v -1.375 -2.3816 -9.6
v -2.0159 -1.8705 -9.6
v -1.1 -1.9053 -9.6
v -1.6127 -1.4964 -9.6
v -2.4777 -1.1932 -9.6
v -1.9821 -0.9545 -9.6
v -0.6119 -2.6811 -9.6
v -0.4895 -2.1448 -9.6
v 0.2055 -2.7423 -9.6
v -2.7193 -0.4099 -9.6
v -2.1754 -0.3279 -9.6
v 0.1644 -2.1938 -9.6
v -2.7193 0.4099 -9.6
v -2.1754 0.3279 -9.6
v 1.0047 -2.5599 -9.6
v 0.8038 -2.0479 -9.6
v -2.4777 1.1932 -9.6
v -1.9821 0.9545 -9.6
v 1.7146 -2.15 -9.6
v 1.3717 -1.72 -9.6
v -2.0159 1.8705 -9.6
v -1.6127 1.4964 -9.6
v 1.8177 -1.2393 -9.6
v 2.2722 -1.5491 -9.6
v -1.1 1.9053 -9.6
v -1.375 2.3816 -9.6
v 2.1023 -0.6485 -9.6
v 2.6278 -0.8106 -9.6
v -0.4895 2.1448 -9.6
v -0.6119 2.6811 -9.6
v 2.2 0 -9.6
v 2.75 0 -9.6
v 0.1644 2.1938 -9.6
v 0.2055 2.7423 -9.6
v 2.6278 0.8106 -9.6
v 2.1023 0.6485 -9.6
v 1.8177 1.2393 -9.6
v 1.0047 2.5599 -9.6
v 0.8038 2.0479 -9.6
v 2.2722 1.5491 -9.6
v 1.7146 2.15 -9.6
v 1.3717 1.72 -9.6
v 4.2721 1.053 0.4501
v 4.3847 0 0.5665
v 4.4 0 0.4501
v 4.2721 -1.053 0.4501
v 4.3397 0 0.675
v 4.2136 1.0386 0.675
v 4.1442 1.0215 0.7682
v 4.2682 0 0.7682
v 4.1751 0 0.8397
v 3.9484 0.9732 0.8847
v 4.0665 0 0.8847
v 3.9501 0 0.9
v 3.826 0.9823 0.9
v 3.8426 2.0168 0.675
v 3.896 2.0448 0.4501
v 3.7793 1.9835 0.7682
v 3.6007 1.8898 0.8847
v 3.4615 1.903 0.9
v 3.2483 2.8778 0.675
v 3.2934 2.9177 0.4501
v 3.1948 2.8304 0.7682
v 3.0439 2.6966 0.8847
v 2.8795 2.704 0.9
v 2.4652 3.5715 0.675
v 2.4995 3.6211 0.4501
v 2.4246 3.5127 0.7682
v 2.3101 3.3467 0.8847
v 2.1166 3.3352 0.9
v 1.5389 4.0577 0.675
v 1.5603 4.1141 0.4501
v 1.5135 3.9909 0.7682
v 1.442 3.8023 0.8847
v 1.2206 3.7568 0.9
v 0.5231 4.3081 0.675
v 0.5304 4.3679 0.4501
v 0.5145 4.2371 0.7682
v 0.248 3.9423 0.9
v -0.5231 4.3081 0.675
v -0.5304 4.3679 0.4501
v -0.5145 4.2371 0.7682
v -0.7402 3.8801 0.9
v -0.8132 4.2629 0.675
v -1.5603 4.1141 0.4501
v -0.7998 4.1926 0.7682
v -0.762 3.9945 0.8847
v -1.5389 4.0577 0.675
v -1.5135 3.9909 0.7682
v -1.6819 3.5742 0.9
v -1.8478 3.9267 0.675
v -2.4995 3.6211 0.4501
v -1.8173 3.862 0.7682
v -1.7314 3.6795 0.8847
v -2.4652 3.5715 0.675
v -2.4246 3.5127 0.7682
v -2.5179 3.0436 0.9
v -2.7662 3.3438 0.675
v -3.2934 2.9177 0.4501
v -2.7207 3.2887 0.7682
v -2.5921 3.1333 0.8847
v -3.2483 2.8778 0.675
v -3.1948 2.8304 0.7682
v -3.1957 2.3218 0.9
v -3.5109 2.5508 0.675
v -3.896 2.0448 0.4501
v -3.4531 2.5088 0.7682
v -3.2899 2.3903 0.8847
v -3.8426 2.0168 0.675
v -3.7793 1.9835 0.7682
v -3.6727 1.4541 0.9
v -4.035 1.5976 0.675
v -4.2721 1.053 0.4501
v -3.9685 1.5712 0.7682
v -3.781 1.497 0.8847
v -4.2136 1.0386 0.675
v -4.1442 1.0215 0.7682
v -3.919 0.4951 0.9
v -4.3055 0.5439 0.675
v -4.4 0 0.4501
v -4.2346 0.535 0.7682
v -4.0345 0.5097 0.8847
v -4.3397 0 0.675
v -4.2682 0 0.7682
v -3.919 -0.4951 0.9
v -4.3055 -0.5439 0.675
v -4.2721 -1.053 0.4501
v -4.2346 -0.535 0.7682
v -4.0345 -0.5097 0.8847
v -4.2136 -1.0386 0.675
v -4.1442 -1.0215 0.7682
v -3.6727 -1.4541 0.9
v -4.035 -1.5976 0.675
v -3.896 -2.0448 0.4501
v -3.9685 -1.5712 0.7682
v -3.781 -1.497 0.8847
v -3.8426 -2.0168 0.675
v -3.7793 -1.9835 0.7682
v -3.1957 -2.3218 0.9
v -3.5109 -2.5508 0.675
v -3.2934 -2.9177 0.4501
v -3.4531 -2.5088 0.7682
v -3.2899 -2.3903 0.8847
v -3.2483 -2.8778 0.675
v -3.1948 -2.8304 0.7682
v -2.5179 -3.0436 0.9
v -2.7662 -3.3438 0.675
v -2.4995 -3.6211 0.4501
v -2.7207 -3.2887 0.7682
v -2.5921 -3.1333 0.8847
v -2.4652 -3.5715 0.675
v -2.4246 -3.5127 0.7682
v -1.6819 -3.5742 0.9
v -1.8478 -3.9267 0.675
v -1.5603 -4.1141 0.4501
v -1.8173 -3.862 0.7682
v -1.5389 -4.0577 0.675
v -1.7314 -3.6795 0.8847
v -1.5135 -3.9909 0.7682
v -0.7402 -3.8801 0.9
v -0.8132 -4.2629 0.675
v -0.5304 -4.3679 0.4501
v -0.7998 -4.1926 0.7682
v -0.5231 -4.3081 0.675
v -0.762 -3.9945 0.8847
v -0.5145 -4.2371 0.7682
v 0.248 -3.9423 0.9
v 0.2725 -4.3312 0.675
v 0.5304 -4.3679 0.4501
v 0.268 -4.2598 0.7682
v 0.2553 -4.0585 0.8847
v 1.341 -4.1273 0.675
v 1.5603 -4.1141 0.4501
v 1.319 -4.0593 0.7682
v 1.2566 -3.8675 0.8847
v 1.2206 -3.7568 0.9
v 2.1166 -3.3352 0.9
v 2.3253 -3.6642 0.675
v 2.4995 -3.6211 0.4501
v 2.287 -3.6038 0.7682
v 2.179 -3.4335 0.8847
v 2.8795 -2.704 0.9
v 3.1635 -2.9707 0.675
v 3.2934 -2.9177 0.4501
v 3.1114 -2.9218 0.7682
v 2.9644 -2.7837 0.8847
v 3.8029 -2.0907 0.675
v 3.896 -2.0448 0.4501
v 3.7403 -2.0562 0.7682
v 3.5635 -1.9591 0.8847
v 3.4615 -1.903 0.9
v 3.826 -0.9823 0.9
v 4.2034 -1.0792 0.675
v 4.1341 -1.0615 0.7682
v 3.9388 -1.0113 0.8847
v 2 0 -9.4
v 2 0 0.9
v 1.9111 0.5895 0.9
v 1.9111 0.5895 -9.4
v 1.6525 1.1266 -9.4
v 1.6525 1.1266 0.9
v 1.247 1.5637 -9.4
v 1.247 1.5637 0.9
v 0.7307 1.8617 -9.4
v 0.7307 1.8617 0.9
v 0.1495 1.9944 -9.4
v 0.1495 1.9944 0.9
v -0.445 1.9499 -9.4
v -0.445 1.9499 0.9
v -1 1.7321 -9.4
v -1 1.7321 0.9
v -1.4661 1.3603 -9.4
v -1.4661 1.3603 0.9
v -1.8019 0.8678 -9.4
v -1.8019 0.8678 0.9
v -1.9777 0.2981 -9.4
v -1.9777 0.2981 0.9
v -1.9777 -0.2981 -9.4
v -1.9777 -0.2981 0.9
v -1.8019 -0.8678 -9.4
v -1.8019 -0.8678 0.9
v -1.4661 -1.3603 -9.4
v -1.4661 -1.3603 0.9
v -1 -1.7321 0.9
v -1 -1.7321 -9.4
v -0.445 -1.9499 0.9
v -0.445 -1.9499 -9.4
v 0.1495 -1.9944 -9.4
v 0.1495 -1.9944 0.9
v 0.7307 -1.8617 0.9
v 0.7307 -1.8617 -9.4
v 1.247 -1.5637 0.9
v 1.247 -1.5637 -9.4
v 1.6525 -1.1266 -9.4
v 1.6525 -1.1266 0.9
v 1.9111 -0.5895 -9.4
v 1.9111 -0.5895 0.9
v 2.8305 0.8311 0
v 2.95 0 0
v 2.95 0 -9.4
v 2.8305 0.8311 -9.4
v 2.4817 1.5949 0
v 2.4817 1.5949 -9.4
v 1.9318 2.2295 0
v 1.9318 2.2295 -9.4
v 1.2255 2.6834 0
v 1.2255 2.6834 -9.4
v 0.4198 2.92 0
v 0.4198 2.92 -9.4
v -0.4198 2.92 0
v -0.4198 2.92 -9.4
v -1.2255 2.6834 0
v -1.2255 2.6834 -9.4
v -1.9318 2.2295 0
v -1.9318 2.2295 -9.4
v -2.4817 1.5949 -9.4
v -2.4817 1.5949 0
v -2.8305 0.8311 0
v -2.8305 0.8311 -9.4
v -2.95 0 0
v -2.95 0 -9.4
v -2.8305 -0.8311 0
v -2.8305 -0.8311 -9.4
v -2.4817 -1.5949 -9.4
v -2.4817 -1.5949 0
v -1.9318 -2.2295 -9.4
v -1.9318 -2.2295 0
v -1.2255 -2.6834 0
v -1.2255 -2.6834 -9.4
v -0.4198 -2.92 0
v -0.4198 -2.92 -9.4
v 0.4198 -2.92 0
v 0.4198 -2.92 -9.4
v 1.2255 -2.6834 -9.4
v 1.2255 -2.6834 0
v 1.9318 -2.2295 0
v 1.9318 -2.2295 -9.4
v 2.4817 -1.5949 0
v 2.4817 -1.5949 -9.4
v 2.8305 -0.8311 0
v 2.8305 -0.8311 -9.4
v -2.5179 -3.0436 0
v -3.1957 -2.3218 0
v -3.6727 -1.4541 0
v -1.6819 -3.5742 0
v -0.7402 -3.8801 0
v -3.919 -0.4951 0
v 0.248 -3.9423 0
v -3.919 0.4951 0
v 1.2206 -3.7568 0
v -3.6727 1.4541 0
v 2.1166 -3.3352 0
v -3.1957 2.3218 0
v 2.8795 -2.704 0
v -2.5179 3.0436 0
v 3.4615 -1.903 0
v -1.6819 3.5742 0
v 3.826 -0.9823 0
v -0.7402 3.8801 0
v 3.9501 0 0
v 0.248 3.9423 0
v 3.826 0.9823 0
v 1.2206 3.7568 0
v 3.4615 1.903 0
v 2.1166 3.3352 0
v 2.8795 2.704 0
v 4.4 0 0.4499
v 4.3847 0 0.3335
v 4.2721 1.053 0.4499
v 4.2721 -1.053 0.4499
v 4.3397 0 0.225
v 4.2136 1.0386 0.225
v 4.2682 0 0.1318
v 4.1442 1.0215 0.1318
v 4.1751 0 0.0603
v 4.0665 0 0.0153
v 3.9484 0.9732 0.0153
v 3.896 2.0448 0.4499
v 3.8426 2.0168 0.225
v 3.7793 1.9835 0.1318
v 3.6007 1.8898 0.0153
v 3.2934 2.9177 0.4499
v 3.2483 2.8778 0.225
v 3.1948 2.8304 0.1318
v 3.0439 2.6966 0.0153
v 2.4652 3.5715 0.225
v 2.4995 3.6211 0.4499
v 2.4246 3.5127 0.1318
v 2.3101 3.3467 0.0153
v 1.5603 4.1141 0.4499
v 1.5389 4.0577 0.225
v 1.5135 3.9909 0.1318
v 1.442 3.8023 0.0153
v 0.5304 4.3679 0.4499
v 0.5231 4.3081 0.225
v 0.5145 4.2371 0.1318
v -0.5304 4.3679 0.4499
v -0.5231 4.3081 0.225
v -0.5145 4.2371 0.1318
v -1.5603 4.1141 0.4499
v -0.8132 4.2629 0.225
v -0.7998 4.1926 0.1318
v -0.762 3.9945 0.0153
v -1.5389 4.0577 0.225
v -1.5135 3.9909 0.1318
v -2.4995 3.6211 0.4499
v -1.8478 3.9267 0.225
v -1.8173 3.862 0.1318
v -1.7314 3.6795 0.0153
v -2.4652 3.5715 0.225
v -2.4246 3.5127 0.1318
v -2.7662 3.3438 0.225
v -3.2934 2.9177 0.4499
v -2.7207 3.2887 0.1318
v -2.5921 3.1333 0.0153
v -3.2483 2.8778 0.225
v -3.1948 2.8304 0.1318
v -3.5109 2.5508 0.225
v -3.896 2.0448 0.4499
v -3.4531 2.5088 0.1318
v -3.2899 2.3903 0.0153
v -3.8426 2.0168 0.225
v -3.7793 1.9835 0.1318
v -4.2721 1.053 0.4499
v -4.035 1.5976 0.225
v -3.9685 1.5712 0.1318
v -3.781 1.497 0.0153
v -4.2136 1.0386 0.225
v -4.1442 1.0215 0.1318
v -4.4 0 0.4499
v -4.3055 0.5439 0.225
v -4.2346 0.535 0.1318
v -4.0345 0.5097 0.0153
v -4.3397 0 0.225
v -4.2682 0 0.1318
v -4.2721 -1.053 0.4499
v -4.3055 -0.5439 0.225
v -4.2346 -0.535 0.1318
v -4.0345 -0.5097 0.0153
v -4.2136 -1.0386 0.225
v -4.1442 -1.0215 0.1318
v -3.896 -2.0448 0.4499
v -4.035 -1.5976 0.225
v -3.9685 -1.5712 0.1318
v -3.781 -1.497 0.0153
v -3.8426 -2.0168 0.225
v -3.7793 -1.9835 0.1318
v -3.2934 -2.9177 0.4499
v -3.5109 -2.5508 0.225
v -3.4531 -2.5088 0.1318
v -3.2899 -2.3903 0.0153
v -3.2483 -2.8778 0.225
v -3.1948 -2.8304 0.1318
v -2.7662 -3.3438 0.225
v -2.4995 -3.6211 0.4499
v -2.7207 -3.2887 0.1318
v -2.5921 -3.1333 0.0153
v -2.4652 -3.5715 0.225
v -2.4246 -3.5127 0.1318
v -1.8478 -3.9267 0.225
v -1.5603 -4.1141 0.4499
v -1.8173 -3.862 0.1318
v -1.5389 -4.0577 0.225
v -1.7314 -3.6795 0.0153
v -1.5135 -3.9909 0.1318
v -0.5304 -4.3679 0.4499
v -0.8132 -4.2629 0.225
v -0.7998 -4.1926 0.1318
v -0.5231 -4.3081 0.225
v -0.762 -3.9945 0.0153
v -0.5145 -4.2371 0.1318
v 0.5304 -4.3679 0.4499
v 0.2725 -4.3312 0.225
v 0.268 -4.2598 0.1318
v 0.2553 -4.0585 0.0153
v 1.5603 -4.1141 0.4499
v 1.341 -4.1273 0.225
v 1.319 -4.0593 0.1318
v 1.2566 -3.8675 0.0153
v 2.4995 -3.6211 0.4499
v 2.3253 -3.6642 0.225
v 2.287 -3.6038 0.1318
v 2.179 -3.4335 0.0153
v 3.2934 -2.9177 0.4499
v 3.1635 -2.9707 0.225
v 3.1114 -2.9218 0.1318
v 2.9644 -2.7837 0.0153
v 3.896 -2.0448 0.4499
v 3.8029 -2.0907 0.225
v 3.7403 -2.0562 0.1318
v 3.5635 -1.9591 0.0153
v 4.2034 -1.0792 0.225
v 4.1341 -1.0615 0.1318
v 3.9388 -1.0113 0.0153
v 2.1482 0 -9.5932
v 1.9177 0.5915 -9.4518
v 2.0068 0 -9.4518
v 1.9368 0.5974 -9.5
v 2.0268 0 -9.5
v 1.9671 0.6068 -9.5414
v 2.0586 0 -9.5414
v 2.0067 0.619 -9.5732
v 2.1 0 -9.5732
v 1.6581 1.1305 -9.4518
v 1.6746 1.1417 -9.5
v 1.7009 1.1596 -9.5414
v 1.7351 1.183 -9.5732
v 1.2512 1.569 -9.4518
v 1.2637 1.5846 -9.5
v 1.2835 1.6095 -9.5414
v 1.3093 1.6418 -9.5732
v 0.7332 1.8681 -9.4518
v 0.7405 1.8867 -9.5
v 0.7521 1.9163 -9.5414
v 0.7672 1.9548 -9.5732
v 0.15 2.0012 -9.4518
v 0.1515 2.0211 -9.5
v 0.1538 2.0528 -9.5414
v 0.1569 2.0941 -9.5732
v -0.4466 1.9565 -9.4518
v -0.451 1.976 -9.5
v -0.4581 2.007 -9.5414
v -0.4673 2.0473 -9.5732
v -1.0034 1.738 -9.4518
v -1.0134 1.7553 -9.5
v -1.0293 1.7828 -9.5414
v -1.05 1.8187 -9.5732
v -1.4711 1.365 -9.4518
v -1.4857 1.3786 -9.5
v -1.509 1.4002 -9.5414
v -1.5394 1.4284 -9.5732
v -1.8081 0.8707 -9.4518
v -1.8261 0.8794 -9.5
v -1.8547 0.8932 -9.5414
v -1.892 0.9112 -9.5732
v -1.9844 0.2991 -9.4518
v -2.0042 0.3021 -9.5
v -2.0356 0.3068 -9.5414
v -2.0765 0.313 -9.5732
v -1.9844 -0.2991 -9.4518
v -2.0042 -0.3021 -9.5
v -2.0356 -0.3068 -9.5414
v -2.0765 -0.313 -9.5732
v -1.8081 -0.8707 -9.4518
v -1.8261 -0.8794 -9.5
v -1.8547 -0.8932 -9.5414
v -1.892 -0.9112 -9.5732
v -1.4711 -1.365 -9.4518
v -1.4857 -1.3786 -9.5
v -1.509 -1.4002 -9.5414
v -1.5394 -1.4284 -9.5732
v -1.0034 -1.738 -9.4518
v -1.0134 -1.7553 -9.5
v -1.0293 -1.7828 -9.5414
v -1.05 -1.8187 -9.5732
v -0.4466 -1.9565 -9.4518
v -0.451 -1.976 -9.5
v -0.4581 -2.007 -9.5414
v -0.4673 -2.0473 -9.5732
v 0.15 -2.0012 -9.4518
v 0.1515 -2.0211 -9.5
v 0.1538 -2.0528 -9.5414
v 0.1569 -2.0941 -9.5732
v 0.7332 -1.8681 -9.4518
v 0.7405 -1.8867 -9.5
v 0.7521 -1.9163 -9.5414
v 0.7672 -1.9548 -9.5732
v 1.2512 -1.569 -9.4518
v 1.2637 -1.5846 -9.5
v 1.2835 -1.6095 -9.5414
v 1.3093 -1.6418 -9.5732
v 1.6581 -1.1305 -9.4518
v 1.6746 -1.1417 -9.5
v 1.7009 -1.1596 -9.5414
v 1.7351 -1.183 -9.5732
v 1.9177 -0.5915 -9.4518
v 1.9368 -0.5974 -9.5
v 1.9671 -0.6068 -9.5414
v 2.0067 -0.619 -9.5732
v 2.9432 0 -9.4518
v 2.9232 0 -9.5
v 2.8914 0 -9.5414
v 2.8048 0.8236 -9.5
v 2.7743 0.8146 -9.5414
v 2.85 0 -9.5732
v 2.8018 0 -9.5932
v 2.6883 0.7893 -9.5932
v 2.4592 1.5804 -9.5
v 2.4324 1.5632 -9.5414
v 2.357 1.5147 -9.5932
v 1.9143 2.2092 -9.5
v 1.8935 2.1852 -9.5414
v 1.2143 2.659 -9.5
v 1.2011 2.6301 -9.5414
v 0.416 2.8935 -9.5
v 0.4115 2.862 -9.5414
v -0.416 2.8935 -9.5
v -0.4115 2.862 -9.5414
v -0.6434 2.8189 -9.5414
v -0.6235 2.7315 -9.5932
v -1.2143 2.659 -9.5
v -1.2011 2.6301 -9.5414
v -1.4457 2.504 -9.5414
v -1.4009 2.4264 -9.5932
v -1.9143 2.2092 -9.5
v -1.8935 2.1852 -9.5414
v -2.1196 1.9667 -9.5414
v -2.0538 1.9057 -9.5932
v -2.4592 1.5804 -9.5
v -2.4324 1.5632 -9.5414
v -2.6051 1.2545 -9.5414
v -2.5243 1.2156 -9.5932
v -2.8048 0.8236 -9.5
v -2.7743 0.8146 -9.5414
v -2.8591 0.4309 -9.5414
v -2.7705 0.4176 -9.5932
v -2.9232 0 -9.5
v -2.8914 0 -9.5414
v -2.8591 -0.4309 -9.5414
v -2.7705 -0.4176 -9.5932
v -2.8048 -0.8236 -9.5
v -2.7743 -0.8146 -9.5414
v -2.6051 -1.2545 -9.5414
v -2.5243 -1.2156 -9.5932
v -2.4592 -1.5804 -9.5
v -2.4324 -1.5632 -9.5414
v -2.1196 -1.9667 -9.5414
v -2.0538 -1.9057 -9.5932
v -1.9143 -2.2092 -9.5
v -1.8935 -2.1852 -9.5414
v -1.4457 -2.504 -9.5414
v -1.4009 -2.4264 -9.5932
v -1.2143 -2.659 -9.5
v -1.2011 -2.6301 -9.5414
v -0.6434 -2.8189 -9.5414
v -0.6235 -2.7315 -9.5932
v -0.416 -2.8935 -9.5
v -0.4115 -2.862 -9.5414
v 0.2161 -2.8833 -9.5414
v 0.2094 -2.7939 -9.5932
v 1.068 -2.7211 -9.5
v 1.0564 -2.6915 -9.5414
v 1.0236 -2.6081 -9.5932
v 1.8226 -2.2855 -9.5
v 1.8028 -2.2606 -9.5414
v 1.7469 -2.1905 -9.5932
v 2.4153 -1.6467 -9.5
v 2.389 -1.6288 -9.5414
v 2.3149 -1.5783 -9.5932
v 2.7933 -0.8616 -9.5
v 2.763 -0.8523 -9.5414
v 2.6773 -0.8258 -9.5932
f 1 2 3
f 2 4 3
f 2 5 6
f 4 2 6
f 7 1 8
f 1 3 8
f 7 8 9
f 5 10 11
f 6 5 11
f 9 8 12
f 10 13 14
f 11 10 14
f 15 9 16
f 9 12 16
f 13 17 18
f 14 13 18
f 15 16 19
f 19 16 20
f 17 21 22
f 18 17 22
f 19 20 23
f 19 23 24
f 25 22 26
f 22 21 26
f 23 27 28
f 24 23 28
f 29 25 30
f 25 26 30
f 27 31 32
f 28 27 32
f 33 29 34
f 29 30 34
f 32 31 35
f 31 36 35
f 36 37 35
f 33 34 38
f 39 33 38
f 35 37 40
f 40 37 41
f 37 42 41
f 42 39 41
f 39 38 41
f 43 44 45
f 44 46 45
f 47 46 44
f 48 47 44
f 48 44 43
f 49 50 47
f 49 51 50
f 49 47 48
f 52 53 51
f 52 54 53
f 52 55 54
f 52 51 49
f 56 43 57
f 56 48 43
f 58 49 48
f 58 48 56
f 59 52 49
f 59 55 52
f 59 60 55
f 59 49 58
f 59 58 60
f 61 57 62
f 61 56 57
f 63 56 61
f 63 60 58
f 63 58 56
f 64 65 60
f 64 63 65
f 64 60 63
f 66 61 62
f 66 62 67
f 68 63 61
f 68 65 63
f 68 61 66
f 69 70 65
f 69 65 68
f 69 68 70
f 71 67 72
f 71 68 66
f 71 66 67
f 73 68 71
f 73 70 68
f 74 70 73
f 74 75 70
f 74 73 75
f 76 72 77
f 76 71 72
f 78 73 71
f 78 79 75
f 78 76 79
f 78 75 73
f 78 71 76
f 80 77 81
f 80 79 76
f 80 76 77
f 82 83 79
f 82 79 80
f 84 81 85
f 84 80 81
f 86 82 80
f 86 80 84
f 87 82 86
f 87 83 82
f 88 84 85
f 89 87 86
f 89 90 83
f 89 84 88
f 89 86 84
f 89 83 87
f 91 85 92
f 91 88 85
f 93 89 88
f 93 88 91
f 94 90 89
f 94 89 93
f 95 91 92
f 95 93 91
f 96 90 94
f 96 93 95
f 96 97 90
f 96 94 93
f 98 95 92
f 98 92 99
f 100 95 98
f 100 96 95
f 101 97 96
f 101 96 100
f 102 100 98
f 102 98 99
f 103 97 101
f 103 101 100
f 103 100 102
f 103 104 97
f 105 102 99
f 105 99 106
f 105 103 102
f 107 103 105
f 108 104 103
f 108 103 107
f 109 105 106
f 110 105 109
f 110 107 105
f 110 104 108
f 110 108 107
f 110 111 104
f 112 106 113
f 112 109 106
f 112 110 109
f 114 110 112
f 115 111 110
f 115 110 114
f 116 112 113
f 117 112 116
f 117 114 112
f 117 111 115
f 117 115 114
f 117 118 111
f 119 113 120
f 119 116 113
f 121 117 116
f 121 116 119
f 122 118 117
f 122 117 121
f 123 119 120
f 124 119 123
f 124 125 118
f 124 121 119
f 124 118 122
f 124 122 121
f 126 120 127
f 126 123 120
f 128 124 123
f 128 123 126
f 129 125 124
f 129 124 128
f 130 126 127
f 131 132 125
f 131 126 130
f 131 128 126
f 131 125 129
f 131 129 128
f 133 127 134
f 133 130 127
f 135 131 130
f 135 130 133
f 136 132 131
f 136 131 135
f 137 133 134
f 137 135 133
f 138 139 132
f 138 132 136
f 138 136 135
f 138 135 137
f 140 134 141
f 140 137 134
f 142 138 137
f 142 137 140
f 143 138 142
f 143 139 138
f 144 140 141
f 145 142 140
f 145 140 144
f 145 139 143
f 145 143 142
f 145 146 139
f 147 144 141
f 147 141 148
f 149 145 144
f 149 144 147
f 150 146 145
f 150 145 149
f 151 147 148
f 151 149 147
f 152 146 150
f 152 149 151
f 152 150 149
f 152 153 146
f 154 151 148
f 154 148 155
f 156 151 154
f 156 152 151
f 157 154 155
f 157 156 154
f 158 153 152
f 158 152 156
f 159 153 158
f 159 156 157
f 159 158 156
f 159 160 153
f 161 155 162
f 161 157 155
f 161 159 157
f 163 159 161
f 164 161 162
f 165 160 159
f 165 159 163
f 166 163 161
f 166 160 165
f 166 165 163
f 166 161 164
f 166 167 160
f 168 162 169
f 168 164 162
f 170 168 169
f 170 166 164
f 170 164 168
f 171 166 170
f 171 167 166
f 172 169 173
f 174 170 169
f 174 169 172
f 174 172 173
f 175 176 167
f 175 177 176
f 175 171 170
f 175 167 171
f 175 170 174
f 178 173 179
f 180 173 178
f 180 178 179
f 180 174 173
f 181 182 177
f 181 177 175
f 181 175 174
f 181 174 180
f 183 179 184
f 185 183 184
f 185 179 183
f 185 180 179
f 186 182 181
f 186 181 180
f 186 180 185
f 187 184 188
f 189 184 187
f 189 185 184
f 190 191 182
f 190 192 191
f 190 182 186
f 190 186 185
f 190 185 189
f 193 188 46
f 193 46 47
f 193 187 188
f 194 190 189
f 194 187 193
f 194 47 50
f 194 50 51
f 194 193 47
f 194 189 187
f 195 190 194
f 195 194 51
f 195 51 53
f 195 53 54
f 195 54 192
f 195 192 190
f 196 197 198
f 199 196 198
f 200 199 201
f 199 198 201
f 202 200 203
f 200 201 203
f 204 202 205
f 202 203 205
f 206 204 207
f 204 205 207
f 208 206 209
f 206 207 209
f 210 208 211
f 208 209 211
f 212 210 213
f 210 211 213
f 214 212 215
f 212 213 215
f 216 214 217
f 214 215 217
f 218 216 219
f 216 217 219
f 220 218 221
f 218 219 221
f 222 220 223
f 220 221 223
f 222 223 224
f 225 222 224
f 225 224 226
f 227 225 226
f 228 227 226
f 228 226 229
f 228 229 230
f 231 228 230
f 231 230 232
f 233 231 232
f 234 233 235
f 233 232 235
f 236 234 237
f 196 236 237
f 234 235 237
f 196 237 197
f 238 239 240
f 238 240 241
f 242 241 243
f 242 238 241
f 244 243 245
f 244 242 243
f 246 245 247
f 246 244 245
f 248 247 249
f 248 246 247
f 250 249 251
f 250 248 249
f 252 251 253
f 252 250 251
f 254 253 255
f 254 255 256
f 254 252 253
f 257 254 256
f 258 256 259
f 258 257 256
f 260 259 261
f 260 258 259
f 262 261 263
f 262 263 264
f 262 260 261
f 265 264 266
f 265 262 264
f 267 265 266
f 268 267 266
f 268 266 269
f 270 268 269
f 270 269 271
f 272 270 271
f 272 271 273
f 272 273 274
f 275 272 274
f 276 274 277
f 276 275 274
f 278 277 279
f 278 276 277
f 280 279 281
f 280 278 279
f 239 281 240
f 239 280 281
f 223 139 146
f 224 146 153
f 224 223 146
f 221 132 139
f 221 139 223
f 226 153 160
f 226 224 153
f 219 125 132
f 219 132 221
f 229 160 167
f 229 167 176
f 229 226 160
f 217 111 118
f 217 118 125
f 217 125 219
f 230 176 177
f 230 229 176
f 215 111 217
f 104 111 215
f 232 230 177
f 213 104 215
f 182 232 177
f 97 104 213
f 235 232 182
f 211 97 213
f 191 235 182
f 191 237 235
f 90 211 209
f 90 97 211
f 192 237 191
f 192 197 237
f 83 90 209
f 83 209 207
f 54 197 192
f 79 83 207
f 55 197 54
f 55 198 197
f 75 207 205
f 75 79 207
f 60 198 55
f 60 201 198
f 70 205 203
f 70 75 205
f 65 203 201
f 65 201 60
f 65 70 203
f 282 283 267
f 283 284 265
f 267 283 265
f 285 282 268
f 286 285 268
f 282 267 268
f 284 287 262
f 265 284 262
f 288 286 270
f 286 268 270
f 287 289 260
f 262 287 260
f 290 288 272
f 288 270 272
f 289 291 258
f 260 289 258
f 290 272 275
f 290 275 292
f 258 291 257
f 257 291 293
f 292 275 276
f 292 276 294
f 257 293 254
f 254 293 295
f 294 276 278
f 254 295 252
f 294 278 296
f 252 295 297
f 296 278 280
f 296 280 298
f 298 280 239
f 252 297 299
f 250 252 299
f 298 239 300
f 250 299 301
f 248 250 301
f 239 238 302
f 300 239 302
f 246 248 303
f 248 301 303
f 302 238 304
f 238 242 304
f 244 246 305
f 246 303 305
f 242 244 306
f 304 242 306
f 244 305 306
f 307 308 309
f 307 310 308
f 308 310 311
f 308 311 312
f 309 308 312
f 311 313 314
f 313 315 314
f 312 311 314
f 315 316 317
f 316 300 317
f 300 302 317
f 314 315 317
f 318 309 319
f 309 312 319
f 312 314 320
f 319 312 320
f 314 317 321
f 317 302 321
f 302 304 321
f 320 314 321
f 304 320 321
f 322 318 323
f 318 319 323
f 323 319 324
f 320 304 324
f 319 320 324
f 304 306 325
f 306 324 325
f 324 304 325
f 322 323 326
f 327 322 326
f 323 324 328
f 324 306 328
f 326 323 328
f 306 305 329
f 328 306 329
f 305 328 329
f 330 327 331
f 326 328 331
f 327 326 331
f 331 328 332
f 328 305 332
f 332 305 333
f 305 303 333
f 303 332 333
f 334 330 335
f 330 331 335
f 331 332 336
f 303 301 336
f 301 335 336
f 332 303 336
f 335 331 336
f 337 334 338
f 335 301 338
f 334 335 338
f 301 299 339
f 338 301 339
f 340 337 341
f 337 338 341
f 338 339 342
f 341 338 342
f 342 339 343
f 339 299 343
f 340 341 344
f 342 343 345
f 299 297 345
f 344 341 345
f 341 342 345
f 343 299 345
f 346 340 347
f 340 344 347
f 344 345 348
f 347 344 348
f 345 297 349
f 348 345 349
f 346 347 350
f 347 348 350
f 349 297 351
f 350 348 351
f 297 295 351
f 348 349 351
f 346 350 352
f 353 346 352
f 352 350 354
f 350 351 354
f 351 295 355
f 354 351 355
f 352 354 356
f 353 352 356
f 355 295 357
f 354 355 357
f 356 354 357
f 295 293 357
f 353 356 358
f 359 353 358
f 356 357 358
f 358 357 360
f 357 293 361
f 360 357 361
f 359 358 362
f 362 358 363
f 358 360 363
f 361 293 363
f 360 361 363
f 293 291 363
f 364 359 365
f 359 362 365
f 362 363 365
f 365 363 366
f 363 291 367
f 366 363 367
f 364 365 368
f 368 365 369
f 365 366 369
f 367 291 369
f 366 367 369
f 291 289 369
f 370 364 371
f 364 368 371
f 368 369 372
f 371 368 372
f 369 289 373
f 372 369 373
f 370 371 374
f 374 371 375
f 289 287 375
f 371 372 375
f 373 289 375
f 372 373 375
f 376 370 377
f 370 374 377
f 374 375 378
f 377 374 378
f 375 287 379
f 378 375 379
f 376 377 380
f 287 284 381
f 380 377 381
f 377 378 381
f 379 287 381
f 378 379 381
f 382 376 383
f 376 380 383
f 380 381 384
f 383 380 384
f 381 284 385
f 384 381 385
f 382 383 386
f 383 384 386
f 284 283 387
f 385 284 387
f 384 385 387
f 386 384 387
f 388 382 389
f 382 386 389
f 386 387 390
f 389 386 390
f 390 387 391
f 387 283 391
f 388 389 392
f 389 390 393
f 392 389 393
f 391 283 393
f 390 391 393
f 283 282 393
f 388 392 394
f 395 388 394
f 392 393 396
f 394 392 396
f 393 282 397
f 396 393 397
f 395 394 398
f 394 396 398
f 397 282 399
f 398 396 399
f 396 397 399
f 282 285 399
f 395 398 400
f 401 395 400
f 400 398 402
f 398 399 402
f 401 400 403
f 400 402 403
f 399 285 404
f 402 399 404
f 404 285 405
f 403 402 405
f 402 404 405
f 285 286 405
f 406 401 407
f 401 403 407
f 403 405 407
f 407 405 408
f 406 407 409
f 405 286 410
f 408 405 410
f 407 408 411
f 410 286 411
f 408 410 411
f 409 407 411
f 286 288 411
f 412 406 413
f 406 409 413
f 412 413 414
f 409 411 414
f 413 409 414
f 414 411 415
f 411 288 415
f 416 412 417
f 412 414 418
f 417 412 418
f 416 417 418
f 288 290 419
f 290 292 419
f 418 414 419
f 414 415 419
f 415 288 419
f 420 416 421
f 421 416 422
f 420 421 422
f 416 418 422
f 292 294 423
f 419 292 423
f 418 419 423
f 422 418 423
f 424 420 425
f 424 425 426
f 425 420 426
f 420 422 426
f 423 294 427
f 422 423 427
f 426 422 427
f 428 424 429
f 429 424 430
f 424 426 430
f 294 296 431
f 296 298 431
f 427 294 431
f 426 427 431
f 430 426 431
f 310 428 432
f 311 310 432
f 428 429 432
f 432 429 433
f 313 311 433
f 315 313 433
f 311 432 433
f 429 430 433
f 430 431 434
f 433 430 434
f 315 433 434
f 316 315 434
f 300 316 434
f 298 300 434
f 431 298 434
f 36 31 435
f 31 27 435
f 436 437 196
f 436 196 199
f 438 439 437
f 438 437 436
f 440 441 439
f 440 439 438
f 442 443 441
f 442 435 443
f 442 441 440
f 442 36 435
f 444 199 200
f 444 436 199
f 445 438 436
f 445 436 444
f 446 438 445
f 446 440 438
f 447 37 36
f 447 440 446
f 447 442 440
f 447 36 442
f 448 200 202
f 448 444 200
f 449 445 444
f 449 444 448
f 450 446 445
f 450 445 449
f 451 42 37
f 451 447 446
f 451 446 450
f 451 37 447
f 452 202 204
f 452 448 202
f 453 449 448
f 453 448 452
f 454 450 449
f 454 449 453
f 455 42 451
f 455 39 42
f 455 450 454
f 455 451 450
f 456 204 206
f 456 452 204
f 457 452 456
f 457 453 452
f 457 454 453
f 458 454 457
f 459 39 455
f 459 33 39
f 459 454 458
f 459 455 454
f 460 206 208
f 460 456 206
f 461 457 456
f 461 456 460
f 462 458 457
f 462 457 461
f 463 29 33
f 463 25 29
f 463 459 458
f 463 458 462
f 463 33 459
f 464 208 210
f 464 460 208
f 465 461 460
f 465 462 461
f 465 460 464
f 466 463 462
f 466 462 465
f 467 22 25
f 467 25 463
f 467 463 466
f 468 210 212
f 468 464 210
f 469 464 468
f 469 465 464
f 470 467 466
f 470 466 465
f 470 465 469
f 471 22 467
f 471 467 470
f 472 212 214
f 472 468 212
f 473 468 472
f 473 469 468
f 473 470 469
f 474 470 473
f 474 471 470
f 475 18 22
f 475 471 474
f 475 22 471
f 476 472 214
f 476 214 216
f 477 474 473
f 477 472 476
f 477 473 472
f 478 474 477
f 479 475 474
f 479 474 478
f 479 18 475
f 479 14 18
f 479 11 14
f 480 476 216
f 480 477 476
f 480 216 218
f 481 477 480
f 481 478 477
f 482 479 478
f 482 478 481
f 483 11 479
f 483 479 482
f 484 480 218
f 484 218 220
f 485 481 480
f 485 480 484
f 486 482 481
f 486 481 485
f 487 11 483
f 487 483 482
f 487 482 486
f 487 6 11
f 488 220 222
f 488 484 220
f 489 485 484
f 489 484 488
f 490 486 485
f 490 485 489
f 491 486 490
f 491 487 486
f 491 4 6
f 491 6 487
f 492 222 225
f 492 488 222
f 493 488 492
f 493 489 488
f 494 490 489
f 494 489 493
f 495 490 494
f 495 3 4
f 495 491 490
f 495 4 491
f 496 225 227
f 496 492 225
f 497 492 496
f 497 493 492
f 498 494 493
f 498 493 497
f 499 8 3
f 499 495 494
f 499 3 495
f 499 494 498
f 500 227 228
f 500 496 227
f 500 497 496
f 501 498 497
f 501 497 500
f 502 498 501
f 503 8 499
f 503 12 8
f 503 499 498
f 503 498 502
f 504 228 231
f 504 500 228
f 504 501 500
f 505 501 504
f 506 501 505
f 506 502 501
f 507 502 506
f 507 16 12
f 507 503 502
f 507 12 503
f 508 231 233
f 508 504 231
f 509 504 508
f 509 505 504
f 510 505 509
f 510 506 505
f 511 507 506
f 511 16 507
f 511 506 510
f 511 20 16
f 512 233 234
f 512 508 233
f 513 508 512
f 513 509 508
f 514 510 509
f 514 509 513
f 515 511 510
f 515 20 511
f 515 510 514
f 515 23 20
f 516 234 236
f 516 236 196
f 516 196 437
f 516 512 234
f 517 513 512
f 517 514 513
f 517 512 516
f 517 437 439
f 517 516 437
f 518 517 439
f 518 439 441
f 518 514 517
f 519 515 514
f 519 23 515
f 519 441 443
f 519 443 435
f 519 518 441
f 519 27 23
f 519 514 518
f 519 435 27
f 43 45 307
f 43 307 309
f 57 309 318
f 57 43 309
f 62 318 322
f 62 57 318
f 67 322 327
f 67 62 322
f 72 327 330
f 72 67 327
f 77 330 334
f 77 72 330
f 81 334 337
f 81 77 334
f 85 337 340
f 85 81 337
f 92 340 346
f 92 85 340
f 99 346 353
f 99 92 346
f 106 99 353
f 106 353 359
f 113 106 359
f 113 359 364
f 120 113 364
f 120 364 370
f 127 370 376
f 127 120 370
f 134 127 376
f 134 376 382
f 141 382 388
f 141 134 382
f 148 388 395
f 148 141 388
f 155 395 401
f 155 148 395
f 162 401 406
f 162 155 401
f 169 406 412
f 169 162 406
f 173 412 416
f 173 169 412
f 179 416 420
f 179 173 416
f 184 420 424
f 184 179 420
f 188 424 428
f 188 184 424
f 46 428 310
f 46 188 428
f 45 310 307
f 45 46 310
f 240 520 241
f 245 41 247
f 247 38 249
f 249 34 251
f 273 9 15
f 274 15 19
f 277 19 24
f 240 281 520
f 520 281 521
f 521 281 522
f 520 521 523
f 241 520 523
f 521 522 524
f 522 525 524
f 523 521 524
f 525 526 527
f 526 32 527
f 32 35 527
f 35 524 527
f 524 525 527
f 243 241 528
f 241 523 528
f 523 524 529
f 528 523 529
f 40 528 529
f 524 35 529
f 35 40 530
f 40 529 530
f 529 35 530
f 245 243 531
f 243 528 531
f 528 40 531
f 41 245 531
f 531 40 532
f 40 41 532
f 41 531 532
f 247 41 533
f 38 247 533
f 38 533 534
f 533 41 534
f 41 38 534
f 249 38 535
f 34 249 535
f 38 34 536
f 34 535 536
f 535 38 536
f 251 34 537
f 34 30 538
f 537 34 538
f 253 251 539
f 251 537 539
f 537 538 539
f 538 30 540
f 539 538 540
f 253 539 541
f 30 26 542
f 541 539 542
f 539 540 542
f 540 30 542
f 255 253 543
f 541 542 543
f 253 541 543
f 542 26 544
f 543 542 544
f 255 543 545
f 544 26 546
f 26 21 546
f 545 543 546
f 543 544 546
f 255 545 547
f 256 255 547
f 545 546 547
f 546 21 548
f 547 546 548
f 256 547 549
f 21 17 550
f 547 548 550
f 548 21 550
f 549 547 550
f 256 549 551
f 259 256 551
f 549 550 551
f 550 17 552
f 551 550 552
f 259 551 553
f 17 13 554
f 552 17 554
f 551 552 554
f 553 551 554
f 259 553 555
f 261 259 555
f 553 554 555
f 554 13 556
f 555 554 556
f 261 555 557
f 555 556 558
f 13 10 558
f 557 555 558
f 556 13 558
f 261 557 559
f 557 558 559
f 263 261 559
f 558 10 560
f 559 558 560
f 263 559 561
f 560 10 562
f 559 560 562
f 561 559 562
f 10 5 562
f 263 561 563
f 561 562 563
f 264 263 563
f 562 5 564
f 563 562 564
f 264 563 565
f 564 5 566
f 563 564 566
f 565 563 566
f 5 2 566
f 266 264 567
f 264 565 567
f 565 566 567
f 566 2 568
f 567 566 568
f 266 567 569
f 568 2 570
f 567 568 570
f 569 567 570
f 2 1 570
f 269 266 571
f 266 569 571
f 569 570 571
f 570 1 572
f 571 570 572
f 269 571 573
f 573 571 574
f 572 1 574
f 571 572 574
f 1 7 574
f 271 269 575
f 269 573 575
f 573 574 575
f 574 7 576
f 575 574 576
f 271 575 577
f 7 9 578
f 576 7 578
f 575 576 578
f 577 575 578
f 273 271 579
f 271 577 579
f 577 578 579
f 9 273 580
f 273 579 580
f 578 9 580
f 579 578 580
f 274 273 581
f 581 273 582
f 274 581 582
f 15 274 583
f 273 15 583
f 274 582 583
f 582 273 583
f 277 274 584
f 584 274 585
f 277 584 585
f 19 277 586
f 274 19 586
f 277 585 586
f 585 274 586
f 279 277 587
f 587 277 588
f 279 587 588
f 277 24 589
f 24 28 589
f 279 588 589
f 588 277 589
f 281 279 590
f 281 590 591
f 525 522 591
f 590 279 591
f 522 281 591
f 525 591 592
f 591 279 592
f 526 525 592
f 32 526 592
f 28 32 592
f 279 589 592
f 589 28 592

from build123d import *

# Parameters (mm, degrees)
SKETCH_1_R      = 2.95
SKETCH_1_R_2    = 2
EXTRUDE_1_DEPTH = 9.6
EXTRUDE_START   = 0.9
SKETCH_2_R      = 4.4
SKETCH_2_R_2    = 2
EXTRUDE_2_DEPTH = 0.9
FILLET_1_R      = 0.45
FILLET_2_R      = 0.2


with BuildPart() as part:
    # 草图1 → 凸台-拉伸1 (new body)
    with BuildSketch(Plane.XY):
        Circle(SKETCH_1_R)
        Circle(SKETCH_1_R_2, mode=Mode.SUBTRACT)
    extrude(amount=-EXTRUDE_1_DEPTH)

    # 草图2 → 凸台-拉伸2 (add)
    with BuildSketch(Plane.XY.offset(EXTRUDE_START)):
        Circle(SKETCH_2_R)
        Circle(SKETCH_2_R_2, mode=Mode.SUBTRACT)
    extrude(amount=-EXTRUDE_2_DEPTH)

    # 圆角1
    fillet_1_edges = [part.edges().sort_by_distance(p)[0] for p in [
        (-4.4, 0, 0),
        (-4.4, 0, 0.9),
    ]]
    fillet(fillet_1_edges, radius=FILLET_1_R - 0.0001)  # a hair under: the kernel refuses the full size

    # 圆角2
    fillet_2_edges = [part.edges().sort_by_distance(p)[0] for p in [
        (-2.95, 0, -9.6),
        (-2, 0, -9.6),
    ]]
    fillet(fillet_2_edges, radius=FILLET_2_R)


solid = part.part
